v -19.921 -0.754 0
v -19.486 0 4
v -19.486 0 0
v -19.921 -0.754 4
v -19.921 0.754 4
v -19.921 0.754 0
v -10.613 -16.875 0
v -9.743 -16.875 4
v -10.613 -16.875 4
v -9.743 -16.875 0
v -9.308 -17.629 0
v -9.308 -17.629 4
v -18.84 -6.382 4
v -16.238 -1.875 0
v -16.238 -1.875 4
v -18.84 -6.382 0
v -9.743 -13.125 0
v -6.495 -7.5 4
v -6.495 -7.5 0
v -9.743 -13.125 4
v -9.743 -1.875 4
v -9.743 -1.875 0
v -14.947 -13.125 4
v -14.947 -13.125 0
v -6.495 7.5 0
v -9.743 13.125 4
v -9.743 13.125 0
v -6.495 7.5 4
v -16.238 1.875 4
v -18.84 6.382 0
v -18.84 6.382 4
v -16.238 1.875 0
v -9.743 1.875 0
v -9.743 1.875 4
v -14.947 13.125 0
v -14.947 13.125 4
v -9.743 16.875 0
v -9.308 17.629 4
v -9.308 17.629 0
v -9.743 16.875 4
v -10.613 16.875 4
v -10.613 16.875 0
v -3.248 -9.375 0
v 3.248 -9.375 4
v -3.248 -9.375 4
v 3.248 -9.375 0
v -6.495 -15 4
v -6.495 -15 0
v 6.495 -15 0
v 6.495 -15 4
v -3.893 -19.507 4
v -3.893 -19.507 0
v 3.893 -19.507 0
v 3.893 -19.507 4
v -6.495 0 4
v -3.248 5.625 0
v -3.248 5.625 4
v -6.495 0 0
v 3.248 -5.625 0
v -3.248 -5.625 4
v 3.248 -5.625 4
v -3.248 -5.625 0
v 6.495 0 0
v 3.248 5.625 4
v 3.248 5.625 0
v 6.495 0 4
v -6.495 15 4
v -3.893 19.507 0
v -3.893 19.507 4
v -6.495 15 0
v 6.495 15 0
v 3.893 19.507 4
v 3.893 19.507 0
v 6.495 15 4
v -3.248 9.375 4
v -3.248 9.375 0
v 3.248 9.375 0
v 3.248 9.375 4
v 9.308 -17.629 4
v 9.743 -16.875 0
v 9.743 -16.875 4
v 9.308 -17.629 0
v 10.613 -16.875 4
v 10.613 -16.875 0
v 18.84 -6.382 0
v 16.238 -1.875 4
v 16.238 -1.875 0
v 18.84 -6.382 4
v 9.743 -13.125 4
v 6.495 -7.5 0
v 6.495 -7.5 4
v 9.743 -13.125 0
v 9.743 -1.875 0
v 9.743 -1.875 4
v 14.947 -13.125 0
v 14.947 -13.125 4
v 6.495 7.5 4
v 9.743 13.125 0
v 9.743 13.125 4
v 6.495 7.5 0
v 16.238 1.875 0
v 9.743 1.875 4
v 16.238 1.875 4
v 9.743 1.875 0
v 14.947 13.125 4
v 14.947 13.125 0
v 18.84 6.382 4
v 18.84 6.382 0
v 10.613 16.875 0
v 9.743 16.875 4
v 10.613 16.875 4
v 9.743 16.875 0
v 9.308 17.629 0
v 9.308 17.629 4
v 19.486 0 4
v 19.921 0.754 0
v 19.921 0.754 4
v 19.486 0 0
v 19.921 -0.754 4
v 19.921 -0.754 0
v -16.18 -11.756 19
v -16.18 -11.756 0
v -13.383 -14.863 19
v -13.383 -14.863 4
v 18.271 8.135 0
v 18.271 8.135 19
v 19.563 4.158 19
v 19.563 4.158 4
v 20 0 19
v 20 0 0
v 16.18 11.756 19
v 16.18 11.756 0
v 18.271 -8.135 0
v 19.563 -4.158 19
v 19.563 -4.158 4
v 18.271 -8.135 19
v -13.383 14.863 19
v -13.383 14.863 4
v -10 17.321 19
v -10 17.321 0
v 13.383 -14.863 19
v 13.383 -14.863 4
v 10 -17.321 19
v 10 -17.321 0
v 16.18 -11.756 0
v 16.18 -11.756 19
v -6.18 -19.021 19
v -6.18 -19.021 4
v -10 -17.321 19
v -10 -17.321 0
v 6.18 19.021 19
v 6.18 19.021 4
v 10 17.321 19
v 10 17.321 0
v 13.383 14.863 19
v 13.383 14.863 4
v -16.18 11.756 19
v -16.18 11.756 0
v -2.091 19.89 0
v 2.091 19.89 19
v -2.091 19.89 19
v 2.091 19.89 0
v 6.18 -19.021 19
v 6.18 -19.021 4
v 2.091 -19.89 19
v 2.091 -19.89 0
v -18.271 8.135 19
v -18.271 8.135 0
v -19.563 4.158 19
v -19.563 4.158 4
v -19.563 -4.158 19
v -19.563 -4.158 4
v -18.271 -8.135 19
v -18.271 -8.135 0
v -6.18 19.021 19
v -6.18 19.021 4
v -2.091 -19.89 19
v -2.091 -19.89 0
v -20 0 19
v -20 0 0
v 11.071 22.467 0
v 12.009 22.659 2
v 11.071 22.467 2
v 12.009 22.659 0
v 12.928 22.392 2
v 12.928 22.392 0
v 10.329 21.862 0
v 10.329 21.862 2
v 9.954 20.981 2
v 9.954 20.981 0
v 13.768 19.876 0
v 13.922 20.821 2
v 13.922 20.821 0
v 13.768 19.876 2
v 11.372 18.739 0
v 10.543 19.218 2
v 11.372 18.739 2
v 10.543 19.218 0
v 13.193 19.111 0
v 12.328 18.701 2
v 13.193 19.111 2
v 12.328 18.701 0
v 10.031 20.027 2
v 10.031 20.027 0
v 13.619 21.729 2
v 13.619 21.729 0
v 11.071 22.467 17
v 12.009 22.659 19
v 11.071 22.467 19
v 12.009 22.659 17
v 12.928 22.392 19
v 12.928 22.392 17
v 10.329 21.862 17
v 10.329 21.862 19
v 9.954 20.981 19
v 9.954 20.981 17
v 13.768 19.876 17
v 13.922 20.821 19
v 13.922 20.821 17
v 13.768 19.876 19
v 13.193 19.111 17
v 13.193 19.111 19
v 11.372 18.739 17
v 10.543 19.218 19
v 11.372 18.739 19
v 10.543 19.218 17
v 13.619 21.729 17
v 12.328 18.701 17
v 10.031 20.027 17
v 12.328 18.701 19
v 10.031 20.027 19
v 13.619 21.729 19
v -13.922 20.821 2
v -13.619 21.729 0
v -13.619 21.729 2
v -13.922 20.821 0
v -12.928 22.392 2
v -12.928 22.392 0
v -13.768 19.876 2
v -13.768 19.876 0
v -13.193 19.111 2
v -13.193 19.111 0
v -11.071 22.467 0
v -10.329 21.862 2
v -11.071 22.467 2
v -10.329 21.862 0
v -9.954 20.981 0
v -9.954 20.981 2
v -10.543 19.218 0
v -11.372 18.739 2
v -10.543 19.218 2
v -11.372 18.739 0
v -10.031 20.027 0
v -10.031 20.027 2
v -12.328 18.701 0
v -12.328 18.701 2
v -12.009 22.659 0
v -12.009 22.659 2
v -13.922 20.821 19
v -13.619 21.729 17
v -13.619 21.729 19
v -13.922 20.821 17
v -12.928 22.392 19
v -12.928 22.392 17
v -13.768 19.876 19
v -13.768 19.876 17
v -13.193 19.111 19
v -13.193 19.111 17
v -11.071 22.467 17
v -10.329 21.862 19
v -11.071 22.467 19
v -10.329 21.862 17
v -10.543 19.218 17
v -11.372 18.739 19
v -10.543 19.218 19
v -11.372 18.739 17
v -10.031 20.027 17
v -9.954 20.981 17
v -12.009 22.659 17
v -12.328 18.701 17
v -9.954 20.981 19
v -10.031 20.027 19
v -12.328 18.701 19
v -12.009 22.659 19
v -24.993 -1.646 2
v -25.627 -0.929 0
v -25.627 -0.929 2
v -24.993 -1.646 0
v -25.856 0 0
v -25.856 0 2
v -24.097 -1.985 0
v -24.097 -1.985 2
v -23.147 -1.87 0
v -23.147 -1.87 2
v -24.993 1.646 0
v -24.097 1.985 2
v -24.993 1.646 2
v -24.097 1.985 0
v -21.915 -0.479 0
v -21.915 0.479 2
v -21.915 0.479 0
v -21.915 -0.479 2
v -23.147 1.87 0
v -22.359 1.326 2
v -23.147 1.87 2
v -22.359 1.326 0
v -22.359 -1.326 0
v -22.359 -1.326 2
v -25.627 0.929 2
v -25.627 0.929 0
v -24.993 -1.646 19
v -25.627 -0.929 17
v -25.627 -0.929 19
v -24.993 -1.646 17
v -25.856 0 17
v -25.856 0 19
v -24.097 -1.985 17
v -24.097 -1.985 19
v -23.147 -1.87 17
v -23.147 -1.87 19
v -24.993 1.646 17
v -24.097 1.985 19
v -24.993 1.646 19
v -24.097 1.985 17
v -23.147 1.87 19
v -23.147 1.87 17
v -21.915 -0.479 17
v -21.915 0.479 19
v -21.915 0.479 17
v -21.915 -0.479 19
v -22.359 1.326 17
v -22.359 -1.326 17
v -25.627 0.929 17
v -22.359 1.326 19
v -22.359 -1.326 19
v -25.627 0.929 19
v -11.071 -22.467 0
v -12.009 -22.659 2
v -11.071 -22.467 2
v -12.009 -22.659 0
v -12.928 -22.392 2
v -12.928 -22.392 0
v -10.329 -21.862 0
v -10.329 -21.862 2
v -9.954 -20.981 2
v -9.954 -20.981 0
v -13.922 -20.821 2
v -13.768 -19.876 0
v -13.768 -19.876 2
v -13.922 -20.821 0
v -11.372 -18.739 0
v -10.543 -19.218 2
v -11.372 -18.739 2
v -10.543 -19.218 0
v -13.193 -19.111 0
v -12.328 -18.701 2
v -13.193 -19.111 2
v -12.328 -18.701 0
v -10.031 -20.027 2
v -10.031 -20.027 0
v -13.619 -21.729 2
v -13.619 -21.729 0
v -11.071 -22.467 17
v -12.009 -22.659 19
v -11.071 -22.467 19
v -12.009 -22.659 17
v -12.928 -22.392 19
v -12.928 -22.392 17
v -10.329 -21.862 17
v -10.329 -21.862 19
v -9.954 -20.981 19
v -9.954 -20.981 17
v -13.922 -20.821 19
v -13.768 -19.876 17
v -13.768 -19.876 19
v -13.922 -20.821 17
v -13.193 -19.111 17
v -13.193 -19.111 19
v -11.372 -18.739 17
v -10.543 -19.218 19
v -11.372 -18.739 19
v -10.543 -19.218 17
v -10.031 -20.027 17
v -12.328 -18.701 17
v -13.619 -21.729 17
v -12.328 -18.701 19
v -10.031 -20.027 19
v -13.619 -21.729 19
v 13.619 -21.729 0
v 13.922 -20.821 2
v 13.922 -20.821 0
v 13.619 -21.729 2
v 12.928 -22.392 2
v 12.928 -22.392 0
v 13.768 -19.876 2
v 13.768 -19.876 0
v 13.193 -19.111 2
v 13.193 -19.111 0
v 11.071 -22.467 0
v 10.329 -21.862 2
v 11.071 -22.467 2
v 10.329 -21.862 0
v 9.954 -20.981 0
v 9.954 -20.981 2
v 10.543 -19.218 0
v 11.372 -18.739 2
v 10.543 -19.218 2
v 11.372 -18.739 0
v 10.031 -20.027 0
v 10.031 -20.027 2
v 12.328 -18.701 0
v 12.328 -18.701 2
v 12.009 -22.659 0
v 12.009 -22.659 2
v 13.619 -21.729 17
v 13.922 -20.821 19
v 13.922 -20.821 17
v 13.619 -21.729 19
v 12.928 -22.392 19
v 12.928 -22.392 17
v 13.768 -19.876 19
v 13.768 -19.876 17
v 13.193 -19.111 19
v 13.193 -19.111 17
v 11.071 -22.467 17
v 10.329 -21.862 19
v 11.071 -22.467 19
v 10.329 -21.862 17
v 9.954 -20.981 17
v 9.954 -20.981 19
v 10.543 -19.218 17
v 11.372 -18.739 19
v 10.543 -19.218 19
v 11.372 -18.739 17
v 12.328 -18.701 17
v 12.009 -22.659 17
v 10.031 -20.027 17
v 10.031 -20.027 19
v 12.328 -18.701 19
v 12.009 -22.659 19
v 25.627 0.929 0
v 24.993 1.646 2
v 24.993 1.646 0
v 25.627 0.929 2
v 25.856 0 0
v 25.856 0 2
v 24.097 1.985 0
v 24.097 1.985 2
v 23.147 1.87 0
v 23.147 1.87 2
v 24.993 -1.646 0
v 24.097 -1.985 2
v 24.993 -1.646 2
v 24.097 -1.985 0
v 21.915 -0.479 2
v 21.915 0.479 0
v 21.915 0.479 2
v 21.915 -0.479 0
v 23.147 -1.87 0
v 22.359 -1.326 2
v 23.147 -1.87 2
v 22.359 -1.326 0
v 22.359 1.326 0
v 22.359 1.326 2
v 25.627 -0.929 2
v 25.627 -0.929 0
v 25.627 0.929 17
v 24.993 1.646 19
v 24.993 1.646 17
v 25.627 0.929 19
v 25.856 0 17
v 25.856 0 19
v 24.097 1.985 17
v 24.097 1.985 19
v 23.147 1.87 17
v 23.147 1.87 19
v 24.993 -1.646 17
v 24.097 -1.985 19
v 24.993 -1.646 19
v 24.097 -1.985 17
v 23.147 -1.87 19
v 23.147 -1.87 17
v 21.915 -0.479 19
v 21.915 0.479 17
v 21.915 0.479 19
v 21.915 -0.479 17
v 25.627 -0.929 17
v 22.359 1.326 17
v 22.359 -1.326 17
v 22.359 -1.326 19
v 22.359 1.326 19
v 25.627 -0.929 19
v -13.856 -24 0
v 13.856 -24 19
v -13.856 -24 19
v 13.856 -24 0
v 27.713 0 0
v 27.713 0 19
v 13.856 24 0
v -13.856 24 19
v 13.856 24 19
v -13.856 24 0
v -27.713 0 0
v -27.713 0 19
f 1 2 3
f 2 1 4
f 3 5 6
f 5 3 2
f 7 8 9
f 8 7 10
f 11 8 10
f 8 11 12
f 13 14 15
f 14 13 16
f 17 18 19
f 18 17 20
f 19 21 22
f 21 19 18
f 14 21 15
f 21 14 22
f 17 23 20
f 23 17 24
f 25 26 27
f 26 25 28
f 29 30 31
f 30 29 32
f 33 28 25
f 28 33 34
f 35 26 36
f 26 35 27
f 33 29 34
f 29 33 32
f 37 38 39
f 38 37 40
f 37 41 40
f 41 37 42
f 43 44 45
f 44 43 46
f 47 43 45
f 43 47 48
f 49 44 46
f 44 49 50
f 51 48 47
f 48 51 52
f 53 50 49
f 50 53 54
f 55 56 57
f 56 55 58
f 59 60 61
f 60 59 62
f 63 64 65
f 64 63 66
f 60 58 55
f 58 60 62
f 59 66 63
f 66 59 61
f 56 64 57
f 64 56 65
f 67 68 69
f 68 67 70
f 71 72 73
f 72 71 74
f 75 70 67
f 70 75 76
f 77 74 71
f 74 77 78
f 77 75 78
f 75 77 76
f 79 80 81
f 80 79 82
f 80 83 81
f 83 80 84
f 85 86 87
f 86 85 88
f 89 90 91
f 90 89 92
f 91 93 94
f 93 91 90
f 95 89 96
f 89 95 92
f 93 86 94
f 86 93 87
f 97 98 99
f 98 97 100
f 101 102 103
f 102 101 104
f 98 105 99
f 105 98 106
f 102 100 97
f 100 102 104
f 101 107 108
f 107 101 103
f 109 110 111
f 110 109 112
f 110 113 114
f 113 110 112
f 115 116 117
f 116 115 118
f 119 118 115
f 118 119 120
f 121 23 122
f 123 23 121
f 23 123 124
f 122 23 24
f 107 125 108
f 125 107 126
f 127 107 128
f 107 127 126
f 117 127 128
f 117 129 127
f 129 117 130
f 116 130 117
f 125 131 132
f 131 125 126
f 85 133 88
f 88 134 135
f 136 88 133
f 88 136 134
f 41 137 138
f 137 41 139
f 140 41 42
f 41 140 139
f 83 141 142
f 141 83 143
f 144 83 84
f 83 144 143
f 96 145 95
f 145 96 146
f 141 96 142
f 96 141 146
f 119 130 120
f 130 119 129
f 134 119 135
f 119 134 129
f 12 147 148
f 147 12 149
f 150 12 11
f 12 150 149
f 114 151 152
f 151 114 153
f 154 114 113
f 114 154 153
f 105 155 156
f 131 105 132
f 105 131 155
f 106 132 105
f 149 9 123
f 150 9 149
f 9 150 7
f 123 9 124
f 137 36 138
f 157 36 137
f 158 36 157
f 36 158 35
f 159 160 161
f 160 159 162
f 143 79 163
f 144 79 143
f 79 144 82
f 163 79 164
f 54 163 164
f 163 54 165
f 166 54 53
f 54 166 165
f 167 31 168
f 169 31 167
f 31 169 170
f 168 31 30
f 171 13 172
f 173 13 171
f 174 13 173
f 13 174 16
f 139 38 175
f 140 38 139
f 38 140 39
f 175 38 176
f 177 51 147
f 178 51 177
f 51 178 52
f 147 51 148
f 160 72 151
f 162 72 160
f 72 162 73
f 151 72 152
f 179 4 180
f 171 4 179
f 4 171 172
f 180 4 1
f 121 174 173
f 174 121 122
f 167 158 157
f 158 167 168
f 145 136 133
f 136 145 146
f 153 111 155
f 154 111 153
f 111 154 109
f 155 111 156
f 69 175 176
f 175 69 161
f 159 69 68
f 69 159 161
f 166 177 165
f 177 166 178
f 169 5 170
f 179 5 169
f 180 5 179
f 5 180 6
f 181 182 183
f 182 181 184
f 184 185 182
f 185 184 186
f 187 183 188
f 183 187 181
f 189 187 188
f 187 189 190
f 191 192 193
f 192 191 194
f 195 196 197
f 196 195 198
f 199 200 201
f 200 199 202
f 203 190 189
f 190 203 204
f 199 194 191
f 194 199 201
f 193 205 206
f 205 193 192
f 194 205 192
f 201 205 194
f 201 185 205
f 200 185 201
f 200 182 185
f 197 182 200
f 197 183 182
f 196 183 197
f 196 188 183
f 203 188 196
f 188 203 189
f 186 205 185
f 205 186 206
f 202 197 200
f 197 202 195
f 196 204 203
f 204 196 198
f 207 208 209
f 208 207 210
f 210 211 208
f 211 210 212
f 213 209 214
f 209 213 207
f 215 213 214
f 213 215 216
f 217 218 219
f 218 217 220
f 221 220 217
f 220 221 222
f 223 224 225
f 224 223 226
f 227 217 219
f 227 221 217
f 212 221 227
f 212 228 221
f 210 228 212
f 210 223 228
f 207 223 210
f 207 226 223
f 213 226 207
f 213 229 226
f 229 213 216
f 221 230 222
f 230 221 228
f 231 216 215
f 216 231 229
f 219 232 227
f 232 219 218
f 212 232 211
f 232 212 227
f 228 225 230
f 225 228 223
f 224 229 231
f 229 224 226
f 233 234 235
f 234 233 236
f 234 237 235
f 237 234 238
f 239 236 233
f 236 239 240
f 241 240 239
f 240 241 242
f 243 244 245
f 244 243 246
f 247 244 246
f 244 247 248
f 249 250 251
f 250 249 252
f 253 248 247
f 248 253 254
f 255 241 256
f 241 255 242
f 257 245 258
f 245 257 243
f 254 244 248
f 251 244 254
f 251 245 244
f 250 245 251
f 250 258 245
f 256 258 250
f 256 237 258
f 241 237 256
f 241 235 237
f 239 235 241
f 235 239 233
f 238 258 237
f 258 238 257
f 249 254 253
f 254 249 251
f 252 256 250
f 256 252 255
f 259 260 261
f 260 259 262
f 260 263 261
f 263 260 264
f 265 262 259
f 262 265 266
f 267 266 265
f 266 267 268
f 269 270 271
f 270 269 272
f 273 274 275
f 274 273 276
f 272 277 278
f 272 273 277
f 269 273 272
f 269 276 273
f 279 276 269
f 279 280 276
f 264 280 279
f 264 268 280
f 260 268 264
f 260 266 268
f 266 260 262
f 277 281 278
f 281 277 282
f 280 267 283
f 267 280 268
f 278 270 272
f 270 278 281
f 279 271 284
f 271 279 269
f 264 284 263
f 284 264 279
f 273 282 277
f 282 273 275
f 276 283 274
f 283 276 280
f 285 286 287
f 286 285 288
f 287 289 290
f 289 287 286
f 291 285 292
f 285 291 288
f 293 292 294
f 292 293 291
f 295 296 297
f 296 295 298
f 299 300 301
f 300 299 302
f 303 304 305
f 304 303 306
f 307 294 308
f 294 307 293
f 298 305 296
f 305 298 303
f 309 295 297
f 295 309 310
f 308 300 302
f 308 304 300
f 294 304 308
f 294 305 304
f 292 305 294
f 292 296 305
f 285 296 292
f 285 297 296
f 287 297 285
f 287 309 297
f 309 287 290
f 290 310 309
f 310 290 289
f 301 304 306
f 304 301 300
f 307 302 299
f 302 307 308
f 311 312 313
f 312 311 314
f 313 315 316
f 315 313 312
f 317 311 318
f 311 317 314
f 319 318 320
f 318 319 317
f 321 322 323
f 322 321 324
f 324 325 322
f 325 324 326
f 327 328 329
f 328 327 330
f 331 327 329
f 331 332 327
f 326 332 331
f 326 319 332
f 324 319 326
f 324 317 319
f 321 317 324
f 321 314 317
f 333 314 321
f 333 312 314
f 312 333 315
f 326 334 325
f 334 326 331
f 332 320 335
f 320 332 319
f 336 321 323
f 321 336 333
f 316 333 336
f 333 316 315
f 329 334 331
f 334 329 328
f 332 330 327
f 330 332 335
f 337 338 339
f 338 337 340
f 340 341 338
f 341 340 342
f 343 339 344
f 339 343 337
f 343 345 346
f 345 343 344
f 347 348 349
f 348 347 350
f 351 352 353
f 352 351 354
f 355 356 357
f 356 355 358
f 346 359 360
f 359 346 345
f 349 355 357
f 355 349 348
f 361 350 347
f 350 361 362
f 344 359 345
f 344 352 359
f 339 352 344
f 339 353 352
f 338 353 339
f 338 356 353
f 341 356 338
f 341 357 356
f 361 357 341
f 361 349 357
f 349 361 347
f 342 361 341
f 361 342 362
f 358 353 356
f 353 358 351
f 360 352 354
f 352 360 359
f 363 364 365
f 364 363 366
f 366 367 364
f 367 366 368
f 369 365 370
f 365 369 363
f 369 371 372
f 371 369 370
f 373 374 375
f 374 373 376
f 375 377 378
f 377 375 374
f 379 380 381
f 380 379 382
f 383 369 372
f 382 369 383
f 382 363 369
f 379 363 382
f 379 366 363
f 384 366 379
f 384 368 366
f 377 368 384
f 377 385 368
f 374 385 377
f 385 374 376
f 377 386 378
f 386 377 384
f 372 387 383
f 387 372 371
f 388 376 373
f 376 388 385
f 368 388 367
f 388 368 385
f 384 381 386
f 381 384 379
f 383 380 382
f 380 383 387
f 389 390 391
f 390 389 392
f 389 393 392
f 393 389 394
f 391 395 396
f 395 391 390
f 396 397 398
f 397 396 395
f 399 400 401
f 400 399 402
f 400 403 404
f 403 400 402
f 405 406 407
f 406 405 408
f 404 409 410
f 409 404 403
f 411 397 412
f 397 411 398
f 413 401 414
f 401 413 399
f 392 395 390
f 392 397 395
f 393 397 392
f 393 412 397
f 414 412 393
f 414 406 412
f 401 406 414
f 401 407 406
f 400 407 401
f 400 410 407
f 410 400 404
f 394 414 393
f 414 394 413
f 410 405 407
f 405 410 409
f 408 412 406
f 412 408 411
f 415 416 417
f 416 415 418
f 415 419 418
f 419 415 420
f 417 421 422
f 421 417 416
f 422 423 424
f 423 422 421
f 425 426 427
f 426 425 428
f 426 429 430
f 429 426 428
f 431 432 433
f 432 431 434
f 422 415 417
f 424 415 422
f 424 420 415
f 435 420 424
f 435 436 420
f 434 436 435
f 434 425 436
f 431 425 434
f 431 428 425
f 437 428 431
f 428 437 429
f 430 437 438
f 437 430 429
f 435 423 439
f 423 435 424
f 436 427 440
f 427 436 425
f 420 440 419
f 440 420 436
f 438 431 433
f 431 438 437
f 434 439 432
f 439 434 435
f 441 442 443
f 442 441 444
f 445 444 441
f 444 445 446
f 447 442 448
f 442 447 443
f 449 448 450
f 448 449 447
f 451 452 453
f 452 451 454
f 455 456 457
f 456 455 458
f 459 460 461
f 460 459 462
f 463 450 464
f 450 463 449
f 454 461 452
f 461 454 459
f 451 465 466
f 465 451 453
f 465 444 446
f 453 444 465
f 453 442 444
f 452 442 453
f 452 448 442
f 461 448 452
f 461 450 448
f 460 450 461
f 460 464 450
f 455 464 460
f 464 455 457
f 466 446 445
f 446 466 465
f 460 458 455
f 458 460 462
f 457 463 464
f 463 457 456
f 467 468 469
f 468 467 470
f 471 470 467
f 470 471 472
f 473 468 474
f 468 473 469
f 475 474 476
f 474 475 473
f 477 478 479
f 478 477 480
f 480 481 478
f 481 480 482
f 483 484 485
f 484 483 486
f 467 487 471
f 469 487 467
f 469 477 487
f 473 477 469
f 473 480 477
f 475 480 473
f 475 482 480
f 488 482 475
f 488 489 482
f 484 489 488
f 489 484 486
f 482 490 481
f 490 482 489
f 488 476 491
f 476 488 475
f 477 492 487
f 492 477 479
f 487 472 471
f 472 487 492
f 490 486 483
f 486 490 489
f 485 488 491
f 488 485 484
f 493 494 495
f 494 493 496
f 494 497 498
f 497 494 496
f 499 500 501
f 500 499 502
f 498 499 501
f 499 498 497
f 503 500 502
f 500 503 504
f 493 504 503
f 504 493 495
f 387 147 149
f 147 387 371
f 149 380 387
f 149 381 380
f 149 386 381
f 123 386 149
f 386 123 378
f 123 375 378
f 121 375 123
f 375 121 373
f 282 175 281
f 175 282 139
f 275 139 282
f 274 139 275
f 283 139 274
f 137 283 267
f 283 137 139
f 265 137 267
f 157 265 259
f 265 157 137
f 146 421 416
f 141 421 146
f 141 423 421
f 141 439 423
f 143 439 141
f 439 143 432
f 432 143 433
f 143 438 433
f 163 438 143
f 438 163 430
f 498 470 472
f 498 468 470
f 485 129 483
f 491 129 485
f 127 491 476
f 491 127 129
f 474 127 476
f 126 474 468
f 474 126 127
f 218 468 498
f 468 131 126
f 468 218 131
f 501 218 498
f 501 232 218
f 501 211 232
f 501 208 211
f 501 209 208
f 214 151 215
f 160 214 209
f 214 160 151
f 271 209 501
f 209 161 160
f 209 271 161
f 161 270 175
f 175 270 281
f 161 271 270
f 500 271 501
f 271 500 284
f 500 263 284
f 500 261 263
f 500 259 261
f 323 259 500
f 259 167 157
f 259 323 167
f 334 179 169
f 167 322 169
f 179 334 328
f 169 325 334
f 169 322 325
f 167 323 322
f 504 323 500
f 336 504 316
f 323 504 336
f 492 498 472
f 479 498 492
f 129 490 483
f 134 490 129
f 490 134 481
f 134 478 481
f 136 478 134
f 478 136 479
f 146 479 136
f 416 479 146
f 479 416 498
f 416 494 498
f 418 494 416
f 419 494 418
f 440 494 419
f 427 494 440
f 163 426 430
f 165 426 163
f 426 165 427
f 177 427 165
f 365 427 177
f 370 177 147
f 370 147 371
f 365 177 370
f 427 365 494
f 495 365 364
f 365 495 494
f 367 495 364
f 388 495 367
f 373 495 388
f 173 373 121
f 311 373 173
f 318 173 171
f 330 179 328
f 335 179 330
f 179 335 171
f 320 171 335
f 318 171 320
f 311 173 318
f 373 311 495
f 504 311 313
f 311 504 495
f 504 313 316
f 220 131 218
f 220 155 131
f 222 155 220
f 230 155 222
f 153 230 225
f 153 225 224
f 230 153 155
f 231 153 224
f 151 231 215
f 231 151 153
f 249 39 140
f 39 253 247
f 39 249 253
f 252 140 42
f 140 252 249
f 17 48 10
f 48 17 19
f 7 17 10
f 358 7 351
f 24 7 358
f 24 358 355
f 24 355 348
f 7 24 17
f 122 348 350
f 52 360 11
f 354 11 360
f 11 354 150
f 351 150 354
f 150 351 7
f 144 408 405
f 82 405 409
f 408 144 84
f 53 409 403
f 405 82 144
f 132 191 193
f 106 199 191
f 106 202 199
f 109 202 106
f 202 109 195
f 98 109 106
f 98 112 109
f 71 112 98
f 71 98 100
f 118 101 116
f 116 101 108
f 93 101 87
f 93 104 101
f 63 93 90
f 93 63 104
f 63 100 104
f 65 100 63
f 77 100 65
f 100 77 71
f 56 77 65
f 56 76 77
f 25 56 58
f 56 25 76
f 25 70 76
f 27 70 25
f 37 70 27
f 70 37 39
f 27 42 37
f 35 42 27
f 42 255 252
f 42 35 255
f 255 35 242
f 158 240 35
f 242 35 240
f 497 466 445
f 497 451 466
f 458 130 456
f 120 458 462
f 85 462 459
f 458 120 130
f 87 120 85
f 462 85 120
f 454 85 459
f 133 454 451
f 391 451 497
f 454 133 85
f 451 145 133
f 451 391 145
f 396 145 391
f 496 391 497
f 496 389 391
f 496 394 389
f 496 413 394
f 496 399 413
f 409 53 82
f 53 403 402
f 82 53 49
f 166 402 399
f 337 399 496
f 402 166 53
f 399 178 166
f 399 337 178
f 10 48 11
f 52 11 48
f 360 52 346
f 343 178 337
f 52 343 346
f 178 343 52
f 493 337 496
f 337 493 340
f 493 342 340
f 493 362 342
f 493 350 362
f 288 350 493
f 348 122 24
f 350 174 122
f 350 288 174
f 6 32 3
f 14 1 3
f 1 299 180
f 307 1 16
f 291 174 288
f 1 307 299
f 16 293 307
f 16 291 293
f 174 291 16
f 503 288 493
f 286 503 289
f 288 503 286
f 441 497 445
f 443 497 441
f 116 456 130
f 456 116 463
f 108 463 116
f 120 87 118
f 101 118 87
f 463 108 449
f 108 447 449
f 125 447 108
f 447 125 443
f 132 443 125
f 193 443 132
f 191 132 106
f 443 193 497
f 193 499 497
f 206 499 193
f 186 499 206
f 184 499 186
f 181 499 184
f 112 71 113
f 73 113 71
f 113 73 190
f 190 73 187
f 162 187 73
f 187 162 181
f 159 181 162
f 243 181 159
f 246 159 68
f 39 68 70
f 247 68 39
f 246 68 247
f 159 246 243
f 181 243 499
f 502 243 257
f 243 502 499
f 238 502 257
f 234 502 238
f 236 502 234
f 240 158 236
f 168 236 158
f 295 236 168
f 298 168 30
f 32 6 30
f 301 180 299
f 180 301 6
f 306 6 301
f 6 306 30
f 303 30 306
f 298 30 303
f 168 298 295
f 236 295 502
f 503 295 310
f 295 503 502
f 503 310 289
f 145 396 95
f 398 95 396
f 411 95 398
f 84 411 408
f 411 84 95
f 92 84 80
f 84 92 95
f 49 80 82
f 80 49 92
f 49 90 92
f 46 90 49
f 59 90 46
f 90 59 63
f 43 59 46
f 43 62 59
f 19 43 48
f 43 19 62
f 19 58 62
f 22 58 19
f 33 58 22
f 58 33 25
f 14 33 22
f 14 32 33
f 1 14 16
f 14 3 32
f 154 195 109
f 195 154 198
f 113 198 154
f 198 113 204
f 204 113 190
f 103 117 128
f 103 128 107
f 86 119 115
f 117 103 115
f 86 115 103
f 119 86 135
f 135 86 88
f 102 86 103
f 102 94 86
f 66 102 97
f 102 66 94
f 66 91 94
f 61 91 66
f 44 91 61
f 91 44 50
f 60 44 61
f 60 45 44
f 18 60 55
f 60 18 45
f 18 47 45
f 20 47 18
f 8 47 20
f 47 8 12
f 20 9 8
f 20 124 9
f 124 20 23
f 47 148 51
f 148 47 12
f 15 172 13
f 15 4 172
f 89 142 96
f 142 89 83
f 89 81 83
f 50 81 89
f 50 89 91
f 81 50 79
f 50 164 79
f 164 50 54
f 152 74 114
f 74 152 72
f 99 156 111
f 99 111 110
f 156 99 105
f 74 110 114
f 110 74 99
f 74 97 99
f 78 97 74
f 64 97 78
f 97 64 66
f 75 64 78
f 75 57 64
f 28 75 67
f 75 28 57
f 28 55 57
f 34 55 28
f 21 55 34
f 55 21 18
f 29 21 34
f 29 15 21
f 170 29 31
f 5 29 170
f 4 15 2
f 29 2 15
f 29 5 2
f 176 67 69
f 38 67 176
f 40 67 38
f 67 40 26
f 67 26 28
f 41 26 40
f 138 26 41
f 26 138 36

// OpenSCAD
$fs = $preview ? 10 : 1;

// should include slop!
h_soap = 15;
// should include slop!
d_soap = 40;
wall_thickness = 4;

h_magnet = 2;
d_magnet = 4;

hole_spacing = 15;
hole_percent = 75;
/*
# travel soap container
draining epoxy-coated travel soap bar container

## constraints
I want to make something to hold my travel soap bars with the following constraints
1. waterproof - sealed with epoxy resin
2. draining
3. compact
4. sealed completely when closed
5. doesn't drain on top of eachother
6. needs to hold 3 pucks: soap, shampoo, conditioner

## ideation
* so one design could be like stacking cups with two diameters, holes on the bottom and a lid on top.
    * the bottommost one needs an extra lid for transport
* what if there was a shaft that the holders swung out from?
* what if I got some tins -> no draining
* what if it was held together with magnets? then I wouldn't have to worry about expoxy affecting clearances

## final design
five parts: a top lid, three chambers and a bottom lid. hexagons, just for funsies

##for version 2
the chambers could have three sloping feet that nest with the chamber below. one traingle wave
 */

d_hex = (d_soap + 2 * wall_thickness) / cos(30);
module lid() {
    difference() {
        cylinder(d = d_hex, h = wall_thickness, $fn = 6);
        if ($preview)
            translate([0, 0, - .1])
                cylinder(d = d_soap, h = .2);
        //holes for magnets
        for (theta = [60:60:360]) {
            dx = (d_hex + d_soap) / 2 / 2;
            rotate([0, 0, theta])
                translate([dx, 0, - .1])
                    cylinder(d = d_magnet, h = h_magnet + .1);
        }
    }
}

module chamber() {
    difference() {
        //outer hexagon
        cylinder(d = d_hex, h = wall_thickness + h_soap, $fn = 6);
        //void
        translate([0, 0, wall_thickness])
            cylinder(d = d_soap, h = h_soap + .2);
        //holes at the bottom
        translate([0, 0, - .1]) intersection() {
            cylinder(d = d_soap, h = wall_thickness + .2);
            for (i = [- 5:5], j = [- 5:5]) {
                rotate([0,0,30])
                translate([hole_spacing * i, 0, 0])
                    rotate([0, 0, 60])
                    translate([j*hole_spacing,0,0])
                    rotate([0, 0, 30])
                    cylinder(d = hole_spacing * hole_percent / 100 / cos(30), h=wall_thickness+.2,  $fn = 6);
            }
        }
        //holes for magnets
        for (theta = [60:60:360]) {
            dx = (d_hex + d_soap) / 2 / 2;
            rotate([0, 0, theta]) {
                translate([dx, 0, - .1])
                    cylinder(d = d_magnet, h = h_magnet + .1);
                translate([dx, 0, h_soap + wall_thickness - h_magnet])
                    cylinder(d = d_magnet, h = h_magnet + .1);
            }
        }
    }
}

//lid();
chamber();
